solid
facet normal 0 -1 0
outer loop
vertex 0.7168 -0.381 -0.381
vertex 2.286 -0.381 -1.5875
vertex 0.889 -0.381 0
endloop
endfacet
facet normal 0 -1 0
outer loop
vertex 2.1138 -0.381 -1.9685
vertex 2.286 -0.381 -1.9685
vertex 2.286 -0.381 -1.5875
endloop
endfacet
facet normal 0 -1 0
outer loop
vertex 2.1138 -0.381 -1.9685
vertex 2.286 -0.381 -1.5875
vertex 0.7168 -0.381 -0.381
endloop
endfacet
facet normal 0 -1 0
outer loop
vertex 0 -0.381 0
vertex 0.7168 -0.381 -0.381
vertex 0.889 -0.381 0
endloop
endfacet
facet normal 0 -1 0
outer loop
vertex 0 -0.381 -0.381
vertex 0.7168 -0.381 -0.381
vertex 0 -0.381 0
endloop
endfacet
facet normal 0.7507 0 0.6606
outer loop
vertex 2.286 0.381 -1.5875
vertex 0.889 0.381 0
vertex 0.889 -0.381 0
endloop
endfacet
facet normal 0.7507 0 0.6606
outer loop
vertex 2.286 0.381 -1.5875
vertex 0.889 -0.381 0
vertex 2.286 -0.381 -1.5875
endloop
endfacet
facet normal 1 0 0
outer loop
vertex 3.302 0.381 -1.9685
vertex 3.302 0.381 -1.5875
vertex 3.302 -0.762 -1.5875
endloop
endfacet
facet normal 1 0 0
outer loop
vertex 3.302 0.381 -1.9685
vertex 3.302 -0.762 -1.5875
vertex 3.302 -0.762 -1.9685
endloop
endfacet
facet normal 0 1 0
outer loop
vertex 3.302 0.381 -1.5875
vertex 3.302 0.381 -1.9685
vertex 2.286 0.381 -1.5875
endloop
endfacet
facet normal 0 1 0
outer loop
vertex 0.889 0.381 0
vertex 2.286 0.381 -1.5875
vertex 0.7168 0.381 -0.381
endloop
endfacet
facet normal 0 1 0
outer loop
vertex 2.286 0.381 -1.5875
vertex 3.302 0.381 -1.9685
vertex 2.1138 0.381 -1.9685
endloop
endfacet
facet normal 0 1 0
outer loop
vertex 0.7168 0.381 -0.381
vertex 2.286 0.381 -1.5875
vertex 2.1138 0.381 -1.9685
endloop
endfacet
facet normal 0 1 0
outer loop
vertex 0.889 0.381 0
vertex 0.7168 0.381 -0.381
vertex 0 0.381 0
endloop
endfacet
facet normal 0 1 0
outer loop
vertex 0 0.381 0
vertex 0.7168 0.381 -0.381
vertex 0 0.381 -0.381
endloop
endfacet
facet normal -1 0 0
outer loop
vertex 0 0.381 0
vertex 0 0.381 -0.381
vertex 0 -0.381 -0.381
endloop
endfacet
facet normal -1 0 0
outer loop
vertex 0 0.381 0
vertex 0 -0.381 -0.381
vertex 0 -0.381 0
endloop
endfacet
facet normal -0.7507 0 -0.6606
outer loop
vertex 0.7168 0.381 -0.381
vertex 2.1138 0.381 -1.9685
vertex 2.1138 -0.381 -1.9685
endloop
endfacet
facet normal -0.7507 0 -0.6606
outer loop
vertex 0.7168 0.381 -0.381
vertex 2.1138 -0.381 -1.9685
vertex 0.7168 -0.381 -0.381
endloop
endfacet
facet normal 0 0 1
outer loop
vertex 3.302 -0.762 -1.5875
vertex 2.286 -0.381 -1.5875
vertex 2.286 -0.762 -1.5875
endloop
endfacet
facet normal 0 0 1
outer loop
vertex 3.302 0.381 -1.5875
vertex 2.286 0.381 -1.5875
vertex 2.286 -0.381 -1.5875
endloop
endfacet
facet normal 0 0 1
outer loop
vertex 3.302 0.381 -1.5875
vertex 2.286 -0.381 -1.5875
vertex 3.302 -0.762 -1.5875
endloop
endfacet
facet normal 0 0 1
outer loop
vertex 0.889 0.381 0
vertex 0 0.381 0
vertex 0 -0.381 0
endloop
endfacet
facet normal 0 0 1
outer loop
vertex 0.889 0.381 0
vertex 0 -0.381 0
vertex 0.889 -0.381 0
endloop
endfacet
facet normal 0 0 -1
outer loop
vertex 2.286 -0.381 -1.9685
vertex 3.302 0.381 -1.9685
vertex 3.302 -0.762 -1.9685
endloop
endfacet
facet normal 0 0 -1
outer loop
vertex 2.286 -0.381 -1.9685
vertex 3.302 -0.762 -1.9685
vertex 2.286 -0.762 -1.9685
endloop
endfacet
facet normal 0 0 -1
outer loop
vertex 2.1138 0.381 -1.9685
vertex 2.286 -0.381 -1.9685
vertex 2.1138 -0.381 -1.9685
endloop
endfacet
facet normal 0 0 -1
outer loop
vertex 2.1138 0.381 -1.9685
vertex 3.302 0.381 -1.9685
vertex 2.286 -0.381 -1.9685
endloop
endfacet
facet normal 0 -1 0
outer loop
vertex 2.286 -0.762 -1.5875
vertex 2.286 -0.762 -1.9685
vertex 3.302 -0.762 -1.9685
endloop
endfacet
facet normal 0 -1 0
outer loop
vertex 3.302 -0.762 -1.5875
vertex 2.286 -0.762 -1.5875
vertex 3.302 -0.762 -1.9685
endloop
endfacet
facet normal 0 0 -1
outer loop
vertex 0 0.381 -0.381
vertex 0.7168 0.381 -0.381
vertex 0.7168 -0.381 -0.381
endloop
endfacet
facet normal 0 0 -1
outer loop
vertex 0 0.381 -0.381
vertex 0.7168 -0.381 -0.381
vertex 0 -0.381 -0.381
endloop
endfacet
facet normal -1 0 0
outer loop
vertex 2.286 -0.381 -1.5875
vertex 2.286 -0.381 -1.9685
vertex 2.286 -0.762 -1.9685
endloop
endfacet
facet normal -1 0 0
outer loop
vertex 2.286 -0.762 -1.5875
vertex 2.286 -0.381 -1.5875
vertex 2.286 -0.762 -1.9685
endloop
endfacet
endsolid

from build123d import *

# Parameters (mm, degrees)
BOSS_EXTRUDE1_DEPTH = 0.762
SKETCH2_W           = 2.286
SKETCH2_H           = 0.381
CUT_EXTRUDE1_DEPTH  = 2.9685
SKETCH4_W           = 1.016
SKETCH4_H           = 0.381
CUT_EXTRUDE3_DEPTH  = 2.9685


with BuildPart() as part:
    # Sketch1 → Boss-Extrude1 (new body, symmetric)
    with BuildSketch(Plane(origin=(0, 0, 0), x_dir=(1, 0, 0), z_dir=(0, 1, 0))):
        Polygon((0, 0), (0.889, 0), (2.286, 1.5875), (3.302, 1.5875), (3.302, 1.9685), (2.113762829, 1.9685), (0.716762829, 0.381), (0, 0.381), align=None)
    extrude(amount=BOSS_EXTRUDE1_DEPTH, both=True)

    # Sketch2 → Cut-Extrude1 (cut, through all)
    with BuildSketch(Plane(origin=(0, 0, -1.9685), x_dir=(-1, 0, 0), z_dir=(0, 0, -1))):
        with Locations((-1.143, 0.5715)):
            Rectangle(SKETCH2_W, SKETCH2_H)
    cut_extrude1 = extrude(amount=-CUT_EXTRUDE1_DEPTH, mode=Mode.SUBTRACT)

    # Mirror1: Cut-Extrude1 across plane
    add(cut_extrude1.mirror(Plane.ZX), mode=Mode.SUBTRACT)

    # Sketch4 → Cut-Extrude3 (cut, through all)
    with BuildSketch(Plane(origin=(0, 0, -1.9685), x_dir=(-1, 0, 0), z_dir=(0, 0, -1))):
        with Locations((-2.794, 0.5715)):
            Rectangle(SKETCH4_W, SKETCH4_H)
    extrude(amount=-CUT_EXTRUDE3_DEPTH, mode=Mode.SUBTRACT)


solid = part.part
